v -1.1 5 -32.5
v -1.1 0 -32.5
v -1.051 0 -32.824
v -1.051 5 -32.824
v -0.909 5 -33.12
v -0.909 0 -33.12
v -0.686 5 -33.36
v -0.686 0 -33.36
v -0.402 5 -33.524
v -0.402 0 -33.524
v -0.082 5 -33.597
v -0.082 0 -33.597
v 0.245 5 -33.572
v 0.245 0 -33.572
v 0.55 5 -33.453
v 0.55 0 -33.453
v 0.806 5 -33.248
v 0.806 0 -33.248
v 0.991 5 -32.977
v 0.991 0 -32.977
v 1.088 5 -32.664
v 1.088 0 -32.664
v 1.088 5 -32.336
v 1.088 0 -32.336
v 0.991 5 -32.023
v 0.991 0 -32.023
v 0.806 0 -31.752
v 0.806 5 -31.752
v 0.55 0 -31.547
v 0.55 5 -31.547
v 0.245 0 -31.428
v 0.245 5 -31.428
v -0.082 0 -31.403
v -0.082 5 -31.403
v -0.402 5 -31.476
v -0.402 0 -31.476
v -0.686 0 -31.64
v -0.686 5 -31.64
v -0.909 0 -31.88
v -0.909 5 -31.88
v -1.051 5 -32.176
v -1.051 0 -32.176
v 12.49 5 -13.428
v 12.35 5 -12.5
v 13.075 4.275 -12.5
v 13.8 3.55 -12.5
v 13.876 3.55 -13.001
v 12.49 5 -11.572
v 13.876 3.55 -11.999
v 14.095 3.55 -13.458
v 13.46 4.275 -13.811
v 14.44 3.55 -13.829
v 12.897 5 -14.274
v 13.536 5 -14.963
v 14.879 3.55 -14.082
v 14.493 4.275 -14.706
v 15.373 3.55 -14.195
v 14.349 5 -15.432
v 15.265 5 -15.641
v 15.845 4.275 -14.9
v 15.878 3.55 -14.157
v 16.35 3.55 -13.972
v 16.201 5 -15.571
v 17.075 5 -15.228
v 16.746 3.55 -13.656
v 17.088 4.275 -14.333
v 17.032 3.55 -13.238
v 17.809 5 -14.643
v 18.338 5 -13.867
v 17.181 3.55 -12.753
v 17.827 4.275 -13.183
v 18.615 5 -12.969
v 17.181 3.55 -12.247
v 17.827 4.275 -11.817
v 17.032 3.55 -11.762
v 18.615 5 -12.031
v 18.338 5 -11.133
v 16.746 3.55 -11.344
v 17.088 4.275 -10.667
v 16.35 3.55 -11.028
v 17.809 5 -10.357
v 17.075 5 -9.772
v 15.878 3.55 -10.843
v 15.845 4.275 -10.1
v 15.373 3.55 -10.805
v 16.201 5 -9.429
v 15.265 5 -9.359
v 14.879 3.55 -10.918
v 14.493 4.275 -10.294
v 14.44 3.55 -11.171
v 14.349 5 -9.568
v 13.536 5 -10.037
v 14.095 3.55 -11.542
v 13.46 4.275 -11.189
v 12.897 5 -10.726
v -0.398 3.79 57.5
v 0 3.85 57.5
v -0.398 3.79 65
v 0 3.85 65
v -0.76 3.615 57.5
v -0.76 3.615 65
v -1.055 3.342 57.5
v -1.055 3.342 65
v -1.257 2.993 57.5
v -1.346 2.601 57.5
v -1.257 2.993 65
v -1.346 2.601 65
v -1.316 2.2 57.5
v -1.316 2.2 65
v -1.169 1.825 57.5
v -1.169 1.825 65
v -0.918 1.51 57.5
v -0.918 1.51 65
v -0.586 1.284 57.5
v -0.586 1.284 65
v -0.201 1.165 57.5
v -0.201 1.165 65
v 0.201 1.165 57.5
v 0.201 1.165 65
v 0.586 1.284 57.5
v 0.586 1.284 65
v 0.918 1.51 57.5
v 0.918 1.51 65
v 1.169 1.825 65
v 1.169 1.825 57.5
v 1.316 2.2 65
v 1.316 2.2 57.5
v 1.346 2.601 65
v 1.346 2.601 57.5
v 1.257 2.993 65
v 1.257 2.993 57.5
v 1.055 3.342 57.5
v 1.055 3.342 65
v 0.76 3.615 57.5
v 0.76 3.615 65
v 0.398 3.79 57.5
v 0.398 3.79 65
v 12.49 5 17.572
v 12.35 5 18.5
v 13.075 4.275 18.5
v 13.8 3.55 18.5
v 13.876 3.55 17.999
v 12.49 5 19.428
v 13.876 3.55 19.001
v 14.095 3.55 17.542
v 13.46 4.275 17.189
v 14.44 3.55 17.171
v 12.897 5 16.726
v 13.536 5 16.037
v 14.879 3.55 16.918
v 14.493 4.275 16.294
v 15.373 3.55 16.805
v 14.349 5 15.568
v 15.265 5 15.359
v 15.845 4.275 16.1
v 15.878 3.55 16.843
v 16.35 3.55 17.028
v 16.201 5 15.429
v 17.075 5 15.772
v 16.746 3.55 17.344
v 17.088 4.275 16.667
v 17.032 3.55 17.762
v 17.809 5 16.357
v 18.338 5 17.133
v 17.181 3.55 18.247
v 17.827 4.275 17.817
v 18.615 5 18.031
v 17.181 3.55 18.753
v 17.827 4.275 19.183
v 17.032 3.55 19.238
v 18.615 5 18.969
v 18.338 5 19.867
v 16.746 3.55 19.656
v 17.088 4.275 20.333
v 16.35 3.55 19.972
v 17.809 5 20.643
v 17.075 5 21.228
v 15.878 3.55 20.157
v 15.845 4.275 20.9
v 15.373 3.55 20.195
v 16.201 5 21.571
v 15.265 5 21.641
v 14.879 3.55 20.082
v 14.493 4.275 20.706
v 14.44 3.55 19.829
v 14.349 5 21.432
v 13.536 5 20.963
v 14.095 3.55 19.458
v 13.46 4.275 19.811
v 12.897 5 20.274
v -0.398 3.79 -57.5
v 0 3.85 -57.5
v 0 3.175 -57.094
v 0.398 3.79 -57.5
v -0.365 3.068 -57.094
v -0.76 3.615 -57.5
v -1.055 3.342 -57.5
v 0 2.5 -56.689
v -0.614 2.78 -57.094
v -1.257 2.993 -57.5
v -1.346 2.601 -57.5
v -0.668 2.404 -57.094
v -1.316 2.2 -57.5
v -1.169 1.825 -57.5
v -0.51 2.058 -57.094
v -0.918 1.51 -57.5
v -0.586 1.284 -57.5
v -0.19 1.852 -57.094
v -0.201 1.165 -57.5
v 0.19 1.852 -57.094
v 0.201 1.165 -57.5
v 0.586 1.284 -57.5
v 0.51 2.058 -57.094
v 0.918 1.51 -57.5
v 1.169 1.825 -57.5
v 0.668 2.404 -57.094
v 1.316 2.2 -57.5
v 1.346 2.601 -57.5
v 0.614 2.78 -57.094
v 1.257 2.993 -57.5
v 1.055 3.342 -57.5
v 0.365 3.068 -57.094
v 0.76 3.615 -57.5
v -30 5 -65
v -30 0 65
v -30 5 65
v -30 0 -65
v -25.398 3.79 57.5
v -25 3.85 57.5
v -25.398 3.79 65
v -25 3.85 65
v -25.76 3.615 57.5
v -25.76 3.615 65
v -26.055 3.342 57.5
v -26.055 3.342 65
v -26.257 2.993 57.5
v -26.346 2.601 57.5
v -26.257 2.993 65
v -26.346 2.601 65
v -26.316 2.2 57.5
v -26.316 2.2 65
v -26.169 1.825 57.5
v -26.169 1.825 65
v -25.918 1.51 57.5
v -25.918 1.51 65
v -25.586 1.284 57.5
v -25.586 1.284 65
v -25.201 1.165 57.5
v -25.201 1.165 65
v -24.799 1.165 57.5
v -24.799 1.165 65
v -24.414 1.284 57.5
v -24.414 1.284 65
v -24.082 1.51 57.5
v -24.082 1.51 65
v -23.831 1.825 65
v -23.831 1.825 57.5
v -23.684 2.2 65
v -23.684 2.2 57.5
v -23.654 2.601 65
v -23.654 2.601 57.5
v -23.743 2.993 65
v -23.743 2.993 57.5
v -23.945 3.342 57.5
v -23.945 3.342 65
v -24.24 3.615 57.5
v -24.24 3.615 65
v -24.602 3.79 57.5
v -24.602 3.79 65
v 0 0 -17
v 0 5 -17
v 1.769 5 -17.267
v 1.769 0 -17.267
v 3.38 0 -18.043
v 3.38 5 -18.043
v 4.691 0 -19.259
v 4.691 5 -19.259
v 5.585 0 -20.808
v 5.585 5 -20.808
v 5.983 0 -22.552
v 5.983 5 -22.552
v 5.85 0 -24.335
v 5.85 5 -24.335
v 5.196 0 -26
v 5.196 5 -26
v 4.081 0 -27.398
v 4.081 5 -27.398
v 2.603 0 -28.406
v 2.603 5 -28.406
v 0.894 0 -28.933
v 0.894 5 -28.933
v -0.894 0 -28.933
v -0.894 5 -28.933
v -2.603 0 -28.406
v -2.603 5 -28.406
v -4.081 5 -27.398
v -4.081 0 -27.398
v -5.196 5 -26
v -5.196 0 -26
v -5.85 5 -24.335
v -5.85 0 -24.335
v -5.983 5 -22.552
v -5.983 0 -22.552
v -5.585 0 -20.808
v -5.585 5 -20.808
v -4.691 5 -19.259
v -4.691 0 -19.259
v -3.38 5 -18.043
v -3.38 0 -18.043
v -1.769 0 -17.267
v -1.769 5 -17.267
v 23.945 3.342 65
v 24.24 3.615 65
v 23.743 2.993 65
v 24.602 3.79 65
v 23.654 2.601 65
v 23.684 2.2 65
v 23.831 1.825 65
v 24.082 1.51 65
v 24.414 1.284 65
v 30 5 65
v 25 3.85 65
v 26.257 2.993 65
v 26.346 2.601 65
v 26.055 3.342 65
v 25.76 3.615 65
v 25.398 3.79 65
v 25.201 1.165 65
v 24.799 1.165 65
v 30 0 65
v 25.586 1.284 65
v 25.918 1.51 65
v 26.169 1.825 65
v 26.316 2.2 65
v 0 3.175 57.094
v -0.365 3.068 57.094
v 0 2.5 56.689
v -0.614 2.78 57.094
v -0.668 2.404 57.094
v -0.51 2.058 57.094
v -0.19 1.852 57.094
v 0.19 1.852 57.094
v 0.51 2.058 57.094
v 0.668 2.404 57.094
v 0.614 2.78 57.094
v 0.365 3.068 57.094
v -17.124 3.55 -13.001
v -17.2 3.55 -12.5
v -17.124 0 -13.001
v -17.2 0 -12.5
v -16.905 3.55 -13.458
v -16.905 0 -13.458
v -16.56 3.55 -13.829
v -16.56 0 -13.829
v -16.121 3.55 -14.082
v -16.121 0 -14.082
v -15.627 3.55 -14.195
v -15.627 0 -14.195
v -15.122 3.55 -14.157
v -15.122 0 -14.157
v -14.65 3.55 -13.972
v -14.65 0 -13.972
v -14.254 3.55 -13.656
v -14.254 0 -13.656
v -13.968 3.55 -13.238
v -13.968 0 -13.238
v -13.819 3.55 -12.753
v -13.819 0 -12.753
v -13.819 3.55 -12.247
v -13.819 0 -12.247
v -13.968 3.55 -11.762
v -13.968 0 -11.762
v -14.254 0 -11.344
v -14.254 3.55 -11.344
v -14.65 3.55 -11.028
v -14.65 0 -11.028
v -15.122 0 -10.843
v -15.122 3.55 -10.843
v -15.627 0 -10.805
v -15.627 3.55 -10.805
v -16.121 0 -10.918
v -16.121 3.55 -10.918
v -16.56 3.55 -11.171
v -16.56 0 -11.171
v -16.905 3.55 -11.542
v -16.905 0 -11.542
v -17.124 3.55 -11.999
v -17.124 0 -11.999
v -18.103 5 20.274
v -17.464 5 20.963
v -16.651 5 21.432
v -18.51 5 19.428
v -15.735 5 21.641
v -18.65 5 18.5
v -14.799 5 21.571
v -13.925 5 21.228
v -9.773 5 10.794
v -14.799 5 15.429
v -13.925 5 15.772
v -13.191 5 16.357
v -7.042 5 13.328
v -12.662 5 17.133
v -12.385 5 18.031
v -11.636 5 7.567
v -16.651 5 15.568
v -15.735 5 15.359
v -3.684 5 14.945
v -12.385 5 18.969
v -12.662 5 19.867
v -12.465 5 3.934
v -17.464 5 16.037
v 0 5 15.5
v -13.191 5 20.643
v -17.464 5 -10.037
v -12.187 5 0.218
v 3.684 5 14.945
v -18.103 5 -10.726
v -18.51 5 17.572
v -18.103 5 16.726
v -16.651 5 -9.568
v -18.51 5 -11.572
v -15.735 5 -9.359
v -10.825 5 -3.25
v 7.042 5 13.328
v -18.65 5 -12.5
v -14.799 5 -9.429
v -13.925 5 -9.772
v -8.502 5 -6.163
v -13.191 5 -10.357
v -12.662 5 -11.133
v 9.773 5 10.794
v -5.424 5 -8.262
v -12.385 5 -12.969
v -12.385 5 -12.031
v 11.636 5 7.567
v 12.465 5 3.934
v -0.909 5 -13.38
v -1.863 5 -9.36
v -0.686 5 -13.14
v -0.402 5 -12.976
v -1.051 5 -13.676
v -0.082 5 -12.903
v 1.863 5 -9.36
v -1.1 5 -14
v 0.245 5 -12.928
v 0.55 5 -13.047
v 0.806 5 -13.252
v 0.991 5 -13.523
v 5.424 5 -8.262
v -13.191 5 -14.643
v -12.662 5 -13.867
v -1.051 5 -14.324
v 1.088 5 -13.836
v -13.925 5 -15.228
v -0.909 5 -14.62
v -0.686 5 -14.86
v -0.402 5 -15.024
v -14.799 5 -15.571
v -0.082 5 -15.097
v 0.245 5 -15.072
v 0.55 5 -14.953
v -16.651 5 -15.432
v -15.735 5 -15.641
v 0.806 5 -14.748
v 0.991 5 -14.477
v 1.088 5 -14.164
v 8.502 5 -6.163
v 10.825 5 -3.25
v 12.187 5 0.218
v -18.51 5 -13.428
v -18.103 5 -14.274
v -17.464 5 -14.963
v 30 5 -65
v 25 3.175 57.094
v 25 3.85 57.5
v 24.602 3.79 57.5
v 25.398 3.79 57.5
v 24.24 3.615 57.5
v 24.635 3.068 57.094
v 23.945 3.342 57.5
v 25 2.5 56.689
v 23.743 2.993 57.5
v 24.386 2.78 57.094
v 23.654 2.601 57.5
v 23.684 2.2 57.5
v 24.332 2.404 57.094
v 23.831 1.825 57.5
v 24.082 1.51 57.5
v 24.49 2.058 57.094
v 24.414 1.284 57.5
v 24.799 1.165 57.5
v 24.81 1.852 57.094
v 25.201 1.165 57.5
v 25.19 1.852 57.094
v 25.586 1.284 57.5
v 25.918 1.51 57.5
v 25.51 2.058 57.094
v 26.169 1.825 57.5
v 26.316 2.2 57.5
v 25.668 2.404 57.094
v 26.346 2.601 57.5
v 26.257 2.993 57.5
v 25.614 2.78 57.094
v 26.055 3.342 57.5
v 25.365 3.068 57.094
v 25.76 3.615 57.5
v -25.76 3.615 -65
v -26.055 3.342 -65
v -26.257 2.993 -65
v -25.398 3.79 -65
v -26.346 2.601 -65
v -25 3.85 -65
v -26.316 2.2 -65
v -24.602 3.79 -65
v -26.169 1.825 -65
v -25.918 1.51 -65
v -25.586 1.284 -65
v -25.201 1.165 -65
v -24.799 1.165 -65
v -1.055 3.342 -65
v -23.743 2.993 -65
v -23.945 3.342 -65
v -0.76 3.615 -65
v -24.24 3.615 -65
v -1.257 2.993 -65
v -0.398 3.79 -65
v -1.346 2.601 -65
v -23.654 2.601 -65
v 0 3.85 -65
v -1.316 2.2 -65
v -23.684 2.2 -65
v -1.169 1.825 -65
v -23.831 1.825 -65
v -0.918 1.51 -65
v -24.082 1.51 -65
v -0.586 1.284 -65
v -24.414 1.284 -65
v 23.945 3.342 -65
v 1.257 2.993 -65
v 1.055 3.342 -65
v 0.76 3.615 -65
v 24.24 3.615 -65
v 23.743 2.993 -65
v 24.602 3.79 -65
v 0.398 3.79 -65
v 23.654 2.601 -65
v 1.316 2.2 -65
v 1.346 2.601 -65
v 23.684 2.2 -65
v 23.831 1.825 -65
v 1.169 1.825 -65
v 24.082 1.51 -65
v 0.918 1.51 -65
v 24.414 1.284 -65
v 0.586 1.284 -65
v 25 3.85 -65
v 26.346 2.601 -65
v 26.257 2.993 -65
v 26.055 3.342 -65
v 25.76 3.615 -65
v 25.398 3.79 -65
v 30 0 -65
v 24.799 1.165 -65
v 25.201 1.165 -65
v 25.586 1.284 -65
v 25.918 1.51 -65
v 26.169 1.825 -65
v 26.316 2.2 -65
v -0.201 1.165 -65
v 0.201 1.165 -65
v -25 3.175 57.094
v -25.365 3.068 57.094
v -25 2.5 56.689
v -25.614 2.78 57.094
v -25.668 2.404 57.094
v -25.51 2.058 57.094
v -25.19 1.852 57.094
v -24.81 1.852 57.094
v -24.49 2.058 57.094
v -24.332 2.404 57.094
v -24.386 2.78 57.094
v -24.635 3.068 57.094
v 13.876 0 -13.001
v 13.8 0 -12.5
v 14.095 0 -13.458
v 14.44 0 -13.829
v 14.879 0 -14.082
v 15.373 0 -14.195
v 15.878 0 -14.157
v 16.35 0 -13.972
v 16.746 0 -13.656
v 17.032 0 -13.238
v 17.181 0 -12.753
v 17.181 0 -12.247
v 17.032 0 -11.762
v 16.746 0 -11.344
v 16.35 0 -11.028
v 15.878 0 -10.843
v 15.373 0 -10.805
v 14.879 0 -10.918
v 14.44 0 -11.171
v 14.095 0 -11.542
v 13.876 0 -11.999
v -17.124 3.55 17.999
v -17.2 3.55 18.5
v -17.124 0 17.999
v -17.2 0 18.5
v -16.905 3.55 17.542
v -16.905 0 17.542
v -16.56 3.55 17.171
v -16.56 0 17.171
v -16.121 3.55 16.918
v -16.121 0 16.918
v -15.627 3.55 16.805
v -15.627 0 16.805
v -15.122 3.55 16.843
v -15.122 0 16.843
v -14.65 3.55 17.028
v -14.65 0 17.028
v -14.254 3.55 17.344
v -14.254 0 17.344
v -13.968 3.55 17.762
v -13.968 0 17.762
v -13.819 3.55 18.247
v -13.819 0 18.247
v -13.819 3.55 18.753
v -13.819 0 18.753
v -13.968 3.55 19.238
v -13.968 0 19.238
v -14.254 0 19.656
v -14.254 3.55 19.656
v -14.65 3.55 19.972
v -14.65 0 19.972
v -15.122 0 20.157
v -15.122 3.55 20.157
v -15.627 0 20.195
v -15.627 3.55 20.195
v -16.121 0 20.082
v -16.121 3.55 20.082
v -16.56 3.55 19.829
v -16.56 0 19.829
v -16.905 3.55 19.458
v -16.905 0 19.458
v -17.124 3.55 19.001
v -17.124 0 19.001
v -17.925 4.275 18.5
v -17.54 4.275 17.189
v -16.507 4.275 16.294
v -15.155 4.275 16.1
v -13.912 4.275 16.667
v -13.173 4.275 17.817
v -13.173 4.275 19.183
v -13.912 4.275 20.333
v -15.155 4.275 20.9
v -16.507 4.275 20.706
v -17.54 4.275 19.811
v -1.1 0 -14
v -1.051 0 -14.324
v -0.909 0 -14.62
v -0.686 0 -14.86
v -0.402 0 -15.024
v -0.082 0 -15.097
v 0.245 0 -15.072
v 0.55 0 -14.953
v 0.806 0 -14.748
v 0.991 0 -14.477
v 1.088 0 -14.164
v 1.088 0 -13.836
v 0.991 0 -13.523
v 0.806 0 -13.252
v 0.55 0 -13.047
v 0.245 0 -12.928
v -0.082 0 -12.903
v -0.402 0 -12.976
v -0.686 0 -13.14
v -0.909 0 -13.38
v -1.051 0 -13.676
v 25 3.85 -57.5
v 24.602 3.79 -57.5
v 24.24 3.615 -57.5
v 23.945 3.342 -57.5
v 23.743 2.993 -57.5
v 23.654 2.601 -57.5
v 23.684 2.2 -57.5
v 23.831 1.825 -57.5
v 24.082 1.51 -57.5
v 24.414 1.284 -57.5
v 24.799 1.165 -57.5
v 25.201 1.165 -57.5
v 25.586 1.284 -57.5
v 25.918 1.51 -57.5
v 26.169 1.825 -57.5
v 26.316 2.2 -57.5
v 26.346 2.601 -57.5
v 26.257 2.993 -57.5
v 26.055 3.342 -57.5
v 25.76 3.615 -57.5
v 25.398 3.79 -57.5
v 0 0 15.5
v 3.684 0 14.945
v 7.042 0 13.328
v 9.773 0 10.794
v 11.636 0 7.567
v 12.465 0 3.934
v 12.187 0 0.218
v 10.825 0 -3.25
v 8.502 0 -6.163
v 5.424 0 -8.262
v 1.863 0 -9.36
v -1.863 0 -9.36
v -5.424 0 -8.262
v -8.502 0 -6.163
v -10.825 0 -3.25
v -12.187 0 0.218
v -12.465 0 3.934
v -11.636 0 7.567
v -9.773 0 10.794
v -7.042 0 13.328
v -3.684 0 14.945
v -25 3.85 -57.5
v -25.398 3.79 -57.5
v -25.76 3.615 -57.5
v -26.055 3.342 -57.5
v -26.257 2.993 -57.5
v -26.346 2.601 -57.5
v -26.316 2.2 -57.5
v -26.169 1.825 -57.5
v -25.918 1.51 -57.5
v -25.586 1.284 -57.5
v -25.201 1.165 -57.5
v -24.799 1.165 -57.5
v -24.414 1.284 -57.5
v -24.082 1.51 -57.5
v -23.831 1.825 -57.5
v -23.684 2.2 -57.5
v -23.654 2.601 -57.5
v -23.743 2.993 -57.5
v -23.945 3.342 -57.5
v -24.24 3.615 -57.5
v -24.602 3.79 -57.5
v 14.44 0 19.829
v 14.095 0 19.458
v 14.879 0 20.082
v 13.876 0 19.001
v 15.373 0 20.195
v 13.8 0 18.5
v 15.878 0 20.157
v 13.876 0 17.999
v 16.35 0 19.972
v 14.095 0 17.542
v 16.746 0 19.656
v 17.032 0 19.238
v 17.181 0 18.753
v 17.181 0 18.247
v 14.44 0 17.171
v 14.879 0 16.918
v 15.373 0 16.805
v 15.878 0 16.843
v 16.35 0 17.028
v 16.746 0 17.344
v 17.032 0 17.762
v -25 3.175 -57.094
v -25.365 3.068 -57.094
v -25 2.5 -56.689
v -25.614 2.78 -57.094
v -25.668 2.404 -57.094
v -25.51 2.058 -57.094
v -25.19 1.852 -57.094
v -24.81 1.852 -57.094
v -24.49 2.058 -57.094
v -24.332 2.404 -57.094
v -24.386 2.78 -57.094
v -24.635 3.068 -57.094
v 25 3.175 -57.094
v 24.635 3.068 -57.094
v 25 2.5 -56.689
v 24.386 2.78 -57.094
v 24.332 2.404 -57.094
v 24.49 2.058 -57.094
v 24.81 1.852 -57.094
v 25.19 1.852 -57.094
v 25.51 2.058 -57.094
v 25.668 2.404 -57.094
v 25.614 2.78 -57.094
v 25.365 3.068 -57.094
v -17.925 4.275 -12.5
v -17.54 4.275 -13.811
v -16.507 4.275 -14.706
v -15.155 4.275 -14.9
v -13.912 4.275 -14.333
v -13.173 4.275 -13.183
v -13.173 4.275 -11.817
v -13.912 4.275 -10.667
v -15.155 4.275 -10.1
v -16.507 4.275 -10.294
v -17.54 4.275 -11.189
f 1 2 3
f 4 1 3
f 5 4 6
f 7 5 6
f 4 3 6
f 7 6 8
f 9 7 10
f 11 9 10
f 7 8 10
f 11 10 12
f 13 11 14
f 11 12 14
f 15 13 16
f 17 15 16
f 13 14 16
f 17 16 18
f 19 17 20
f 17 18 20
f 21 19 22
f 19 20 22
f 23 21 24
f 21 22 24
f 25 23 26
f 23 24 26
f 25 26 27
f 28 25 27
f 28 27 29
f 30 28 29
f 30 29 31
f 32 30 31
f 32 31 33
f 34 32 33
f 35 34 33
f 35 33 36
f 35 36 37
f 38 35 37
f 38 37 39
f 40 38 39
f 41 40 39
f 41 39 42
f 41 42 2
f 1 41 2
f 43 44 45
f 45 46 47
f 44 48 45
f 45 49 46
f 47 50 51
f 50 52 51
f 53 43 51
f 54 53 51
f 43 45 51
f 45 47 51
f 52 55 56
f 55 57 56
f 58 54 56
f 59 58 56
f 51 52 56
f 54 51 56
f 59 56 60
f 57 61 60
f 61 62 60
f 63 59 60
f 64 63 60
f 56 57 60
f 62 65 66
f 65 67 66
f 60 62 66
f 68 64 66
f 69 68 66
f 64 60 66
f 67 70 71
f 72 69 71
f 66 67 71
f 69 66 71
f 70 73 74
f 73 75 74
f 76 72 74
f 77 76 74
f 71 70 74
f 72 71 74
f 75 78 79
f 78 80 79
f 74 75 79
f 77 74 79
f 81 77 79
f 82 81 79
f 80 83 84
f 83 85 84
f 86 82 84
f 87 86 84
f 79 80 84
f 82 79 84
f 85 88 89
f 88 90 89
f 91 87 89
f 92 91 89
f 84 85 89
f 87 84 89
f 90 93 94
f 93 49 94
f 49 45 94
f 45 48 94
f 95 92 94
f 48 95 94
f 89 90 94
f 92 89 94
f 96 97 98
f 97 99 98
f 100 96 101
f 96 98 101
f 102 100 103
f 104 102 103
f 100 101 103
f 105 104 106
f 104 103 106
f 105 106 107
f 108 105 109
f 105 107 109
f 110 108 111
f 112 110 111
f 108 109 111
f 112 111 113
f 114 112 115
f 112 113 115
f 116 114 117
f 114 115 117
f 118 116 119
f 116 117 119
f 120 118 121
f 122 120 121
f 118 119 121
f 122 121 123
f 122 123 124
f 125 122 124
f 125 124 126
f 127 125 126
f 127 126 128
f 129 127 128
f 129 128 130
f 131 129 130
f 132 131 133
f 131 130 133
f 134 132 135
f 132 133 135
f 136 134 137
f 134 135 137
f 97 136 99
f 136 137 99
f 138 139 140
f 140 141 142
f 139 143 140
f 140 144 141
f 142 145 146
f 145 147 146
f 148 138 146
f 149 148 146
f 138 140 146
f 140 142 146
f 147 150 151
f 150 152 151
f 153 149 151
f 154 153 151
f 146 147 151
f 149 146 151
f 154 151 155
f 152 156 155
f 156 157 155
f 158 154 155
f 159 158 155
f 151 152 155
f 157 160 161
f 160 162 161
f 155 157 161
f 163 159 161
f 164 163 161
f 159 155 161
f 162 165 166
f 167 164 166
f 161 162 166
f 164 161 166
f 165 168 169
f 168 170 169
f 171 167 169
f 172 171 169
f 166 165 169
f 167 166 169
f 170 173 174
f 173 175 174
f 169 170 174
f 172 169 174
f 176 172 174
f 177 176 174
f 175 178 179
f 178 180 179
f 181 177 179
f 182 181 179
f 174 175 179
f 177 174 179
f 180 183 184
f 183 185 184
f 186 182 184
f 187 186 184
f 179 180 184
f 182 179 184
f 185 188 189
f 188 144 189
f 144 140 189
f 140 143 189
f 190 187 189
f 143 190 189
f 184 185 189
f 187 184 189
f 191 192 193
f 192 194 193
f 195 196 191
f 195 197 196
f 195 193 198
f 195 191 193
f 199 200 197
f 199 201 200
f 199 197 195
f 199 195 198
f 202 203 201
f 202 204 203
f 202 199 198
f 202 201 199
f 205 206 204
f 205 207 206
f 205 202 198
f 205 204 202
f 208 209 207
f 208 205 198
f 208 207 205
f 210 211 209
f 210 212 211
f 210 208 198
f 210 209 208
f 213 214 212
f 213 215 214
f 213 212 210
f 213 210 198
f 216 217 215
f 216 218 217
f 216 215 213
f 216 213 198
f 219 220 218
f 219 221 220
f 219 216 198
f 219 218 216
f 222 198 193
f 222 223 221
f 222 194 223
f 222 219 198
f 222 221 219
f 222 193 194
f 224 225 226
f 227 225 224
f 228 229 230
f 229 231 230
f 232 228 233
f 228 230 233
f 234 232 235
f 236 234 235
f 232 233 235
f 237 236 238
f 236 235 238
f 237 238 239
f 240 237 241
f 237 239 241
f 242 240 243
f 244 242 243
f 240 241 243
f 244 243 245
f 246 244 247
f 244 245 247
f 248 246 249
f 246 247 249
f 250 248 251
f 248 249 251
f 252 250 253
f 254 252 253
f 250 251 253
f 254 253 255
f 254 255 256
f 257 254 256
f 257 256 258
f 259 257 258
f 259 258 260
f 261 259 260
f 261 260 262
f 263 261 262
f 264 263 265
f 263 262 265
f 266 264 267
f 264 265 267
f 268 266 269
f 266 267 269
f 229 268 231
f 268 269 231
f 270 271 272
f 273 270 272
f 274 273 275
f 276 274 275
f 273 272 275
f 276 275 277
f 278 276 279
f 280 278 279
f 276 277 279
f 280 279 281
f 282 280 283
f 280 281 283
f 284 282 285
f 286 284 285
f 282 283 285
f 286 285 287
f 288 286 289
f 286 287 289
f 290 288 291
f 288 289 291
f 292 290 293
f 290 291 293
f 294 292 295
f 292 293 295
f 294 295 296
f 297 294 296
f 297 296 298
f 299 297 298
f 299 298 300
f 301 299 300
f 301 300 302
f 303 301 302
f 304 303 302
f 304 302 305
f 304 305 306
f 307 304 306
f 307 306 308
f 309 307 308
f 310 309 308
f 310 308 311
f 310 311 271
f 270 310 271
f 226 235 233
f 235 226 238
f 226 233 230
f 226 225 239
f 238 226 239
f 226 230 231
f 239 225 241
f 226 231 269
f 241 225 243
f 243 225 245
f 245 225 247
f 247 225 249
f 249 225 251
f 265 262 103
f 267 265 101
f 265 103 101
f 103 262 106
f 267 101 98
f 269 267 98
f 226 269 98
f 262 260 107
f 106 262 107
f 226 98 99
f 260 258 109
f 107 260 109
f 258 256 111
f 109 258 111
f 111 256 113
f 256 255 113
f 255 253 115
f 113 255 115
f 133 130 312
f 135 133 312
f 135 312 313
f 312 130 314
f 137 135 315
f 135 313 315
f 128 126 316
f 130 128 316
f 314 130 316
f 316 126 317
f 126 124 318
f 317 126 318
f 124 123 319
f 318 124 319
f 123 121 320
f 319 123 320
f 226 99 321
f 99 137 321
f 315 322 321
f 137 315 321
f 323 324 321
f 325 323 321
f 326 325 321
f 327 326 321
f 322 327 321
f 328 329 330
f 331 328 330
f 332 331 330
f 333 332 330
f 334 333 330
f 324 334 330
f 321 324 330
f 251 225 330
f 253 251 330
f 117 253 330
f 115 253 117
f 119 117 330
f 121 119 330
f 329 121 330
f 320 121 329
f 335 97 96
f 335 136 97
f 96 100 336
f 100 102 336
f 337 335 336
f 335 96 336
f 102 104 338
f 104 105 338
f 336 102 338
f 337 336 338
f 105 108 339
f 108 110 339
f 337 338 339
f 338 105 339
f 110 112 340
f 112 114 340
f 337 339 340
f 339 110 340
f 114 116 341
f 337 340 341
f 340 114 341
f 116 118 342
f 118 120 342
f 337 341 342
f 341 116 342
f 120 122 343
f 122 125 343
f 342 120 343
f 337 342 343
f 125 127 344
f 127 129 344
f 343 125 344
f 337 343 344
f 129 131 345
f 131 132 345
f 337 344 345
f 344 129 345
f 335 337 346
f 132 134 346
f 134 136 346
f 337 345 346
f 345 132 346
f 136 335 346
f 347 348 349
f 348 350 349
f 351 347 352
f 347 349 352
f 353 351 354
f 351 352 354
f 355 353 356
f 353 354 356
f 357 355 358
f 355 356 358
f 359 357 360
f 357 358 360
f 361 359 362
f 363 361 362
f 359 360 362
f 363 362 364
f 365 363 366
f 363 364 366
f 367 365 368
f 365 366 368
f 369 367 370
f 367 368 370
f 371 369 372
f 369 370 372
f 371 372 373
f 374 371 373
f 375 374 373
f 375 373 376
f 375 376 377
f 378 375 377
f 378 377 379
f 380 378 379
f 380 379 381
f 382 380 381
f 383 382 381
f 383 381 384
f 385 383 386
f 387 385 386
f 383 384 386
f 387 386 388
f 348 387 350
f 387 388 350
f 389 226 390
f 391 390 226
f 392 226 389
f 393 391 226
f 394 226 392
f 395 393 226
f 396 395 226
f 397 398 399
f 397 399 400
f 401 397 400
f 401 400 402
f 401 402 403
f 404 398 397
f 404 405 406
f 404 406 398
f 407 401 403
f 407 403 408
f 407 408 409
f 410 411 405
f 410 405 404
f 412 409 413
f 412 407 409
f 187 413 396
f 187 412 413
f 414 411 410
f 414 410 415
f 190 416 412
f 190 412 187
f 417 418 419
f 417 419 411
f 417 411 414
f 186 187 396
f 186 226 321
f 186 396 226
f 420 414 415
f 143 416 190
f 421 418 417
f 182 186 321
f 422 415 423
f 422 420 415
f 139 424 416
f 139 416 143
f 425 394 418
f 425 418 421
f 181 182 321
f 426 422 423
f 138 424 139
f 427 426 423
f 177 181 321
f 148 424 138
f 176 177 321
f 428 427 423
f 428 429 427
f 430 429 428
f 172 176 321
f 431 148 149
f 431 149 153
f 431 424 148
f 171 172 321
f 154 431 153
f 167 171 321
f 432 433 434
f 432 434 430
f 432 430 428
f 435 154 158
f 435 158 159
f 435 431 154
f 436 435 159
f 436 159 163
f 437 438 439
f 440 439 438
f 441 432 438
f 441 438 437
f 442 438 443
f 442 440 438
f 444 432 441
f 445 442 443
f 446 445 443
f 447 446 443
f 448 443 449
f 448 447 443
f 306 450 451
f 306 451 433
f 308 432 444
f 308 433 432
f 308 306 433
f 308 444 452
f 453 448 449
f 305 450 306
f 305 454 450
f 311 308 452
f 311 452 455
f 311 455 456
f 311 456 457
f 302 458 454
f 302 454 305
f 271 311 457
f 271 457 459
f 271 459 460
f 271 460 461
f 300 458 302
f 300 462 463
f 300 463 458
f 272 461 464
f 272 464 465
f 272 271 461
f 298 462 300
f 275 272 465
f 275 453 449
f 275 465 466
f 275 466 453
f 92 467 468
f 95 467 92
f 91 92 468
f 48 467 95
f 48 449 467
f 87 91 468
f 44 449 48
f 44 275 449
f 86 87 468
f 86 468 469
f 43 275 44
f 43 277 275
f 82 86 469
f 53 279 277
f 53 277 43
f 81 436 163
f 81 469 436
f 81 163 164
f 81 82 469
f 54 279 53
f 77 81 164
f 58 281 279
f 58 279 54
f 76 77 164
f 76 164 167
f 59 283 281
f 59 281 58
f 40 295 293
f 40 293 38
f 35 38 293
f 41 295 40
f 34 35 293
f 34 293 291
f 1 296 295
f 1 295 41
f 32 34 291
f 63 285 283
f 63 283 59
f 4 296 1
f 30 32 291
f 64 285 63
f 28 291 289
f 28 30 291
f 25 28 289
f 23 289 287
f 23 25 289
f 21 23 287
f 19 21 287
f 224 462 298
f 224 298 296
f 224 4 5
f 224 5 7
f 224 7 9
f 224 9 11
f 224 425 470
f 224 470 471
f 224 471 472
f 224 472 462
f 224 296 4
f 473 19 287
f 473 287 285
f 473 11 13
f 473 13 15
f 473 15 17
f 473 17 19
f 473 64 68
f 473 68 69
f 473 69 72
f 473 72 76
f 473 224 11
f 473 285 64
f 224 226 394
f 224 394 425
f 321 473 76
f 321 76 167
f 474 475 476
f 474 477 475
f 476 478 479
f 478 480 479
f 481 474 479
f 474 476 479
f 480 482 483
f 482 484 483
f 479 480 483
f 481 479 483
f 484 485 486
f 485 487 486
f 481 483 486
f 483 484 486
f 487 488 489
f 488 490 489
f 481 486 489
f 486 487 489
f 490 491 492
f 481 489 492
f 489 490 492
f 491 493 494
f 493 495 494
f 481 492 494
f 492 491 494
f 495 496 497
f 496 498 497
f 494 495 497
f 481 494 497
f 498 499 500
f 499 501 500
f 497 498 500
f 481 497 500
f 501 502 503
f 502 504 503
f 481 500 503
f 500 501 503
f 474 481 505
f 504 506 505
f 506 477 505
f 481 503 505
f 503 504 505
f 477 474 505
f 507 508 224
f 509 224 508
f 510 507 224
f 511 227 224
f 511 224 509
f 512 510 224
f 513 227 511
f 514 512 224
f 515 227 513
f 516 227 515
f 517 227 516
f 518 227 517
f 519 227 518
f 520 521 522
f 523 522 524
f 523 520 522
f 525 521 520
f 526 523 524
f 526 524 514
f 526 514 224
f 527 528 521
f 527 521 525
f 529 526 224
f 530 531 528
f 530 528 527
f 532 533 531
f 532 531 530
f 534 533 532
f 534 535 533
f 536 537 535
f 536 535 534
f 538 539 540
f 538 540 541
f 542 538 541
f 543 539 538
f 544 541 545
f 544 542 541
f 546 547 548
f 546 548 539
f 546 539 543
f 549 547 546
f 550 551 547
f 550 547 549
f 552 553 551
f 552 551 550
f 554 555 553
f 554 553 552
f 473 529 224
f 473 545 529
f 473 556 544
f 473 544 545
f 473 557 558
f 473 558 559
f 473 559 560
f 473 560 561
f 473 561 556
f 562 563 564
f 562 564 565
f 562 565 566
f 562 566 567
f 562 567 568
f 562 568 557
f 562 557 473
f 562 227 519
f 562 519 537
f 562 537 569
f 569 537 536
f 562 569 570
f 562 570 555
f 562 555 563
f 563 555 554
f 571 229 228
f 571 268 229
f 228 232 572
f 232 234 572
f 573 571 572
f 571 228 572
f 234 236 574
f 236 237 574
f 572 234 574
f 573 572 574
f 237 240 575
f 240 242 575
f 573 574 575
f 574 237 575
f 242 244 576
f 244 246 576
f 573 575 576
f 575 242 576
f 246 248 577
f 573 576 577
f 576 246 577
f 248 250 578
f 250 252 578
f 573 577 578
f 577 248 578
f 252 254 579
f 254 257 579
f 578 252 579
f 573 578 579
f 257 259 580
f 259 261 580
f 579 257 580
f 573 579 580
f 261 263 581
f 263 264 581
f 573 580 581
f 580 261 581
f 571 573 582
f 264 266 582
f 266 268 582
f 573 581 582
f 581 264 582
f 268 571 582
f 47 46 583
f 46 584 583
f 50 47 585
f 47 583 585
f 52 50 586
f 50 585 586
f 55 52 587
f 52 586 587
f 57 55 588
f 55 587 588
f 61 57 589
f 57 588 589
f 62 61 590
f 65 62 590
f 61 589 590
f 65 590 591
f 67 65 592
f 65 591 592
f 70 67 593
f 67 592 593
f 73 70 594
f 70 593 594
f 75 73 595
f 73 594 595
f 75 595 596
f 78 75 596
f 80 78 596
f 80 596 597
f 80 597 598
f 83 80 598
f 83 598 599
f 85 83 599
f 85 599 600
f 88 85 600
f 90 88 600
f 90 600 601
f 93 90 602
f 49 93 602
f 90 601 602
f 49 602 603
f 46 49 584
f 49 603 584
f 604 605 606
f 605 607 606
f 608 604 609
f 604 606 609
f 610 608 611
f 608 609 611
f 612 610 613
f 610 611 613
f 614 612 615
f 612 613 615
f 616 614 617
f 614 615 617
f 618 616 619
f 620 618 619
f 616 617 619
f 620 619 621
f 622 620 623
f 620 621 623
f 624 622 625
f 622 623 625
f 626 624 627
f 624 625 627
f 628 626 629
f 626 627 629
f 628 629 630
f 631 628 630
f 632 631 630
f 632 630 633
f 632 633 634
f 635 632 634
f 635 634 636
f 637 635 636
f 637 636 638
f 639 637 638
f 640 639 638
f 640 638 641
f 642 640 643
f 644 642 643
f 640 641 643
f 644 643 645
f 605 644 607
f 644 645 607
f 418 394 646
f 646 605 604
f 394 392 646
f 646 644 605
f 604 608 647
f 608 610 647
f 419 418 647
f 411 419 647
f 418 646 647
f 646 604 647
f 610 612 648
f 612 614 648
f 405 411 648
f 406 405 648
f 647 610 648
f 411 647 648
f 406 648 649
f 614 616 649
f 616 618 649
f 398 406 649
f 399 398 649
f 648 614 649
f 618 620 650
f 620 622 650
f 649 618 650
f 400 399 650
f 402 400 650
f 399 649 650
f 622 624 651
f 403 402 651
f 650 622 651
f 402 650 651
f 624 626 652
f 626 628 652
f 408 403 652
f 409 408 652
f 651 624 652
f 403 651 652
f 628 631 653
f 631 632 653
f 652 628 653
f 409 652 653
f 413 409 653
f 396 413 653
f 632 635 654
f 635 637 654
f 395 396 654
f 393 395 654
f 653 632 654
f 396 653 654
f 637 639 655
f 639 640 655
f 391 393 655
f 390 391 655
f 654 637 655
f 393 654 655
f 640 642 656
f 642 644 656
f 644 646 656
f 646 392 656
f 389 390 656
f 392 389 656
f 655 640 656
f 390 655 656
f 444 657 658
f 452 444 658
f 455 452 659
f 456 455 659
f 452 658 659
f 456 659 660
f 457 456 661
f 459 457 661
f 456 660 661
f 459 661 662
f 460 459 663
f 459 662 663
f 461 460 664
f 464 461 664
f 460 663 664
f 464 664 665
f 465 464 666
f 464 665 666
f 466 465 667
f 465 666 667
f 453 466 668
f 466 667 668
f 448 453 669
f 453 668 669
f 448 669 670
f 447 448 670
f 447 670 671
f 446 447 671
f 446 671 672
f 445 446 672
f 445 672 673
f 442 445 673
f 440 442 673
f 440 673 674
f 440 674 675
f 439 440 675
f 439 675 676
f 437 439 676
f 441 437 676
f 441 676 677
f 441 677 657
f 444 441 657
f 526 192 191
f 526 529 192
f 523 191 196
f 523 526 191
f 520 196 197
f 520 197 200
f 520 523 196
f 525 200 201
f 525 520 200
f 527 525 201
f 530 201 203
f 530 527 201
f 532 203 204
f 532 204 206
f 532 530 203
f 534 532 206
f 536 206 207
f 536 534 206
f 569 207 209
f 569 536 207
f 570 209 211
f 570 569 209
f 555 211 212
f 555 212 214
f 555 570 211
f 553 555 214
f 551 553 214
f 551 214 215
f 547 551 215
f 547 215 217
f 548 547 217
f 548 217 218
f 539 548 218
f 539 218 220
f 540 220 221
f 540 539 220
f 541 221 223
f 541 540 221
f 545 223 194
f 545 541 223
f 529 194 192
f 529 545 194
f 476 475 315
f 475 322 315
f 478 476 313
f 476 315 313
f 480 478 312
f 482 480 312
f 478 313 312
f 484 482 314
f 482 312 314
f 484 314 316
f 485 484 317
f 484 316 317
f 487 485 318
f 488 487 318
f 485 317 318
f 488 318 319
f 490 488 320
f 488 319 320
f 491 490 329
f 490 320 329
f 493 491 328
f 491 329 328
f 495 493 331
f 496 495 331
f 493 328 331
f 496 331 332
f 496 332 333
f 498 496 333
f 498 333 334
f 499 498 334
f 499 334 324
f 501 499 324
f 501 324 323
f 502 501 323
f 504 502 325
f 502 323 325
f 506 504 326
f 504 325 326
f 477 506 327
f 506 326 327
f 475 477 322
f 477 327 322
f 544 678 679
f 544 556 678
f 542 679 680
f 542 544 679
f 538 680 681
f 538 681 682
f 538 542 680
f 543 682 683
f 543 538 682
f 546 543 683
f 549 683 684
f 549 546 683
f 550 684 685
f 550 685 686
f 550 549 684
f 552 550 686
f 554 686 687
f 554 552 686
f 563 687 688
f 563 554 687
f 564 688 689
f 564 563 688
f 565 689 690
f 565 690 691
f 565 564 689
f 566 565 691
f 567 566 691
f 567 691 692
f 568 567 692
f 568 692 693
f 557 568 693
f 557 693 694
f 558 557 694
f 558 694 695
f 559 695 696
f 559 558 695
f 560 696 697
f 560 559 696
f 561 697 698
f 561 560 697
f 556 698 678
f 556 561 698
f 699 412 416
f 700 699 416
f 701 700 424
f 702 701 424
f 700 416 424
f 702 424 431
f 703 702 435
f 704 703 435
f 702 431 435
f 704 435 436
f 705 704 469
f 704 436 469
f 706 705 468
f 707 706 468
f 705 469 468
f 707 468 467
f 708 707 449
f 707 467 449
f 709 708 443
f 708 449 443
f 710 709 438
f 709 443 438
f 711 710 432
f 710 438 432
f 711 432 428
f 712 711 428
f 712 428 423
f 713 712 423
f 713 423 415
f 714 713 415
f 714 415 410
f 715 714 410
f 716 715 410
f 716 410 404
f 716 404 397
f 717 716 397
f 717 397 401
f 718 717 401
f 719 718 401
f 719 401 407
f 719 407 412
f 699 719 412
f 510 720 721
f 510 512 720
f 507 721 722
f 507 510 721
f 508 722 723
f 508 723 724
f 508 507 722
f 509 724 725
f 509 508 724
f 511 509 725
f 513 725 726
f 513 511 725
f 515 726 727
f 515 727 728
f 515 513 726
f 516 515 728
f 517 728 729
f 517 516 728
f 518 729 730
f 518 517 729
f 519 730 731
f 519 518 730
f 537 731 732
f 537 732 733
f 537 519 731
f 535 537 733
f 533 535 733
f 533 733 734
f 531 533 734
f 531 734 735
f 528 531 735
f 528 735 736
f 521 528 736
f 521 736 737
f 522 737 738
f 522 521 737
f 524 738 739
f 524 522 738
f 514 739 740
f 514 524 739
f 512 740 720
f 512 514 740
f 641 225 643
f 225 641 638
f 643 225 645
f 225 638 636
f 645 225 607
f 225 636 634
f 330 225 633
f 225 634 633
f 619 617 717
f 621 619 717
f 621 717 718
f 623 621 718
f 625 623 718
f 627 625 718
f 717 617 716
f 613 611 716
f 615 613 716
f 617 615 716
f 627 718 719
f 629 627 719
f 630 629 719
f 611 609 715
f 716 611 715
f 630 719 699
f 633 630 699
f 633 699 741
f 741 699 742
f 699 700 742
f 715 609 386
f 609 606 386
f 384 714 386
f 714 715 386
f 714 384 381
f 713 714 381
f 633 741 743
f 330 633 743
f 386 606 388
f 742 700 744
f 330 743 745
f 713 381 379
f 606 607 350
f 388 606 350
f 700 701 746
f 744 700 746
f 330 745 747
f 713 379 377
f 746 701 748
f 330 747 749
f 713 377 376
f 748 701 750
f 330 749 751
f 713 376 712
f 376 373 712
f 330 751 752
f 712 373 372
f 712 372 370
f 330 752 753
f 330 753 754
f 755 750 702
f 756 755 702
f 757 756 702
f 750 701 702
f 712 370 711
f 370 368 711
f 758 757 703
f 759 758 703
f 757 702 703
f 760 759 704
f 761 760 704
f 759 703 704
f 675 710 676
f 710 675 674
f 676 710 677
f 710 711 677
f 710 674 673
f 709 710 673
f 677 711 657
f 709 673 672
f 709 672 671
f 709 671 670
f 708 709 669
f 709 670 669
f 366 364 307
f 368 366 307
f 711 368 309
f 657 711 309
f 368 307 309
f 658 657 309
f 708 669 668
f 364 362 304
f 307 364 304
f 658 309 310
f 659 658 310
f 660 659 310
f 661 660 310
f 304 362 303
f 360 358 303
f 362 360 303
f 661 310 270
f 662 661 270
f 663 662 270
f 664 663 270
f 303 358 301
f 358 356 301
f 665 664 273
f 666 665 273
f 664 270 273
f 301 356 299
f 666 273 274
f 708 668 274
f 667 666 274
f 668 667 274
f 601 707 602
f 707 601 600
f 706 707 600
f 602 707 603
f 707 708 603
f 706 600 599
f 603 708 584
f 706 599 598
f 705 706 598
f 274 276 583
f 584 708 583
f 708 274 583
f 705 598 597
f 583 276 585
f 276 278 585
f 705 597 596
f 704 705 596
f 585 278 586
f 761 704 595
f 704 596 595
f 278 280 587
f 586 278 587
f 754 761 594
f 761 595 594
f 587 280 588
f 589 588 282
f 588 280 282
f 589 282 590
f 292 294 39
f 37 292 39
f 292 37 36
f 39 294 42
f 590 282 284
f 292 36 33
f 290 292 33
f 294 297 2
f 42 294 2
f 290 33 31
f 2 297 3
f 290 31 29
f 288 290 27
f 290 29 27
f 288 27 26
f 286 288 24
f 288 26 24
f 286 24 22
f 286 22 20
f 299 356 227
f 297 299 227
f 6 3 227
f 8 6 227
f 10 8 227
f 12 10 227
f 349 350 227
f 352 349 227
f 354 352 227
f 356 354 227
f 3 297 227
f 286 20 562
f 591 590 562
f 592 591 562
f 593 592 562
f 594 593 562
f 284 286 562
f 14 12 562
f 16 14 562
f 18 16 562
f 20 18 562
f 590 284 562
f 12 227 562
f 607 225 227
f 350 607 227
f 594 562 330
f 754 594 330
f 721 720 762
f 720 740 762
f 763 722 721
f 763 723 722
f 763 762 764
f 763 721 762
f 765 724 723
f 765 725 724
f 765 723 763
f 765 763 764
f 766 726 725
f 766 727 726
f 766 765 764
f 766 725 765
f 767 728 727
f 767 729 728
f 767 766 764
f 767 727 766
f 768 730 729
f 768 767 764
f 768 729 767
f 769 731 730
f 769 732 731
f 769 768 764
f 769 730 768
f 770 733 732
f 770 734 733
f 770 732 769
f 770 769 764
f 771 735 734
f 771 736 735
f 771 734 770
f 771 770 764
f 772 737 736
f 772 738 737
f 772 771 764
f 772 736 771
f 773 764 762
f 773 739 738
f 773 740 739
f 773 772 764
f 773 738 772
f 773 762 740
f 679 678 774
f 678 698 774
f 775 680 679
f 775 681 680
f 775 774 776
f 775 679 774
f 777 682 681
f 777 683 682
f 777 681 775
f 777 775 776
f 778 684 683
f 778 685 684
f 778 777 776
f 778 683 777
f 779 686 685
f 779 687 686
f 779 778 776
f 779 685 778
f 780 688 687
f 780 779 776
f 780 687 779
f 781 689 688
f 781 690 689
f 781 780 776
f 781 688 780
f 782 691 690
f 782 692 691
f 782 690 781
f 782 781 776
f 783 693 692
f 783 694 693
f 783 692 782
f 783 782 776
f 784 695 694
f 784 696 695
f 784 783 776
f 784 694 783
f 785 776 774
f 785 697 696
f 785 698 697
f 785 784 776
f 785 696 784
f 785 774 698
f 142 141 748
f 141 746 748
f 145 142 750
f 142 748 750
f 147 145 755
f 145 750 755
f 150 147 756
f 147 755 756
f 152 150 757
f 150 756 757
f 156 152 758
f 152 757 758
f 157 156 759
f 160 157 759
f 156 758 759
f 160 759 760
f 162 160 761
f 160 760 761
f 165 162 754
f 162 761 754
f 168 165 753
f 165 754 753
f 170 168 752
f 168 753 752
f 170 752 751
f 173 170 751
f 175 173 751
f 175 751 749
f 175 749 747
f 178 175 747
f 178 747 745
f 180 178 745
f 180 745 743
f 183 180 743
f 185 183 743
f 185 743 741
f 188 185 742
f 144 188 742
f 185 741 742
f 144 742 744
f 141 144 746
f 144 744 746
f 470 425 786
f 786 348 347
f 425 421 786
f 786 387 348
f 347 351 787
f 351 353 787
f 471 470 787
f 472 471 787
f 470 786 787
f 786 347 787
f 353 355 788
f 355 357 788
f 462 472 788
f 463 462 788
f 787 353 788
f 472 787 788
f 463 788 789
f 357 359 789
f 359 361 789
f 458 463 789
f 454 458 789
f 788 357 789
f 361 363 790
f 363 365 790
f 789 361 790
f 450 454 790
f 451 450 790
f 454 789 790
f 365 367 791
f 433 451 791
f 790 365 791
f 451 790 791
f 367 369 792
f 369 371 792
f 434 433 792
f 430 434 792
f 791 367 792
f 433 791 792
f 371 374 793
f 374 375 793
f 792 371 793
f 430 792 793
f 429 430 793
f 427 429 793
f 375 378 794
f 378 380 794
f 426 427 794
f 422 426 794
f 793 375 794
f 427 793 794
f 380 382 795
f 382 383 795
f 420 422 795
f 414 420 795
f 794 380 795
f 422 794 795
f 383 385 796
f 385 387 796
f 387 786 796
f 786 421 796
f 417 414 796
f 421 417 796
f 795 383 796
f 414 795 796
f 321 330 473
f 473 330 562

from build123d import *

# Parameters (mm, degrees)
SKETCH_1_W                   = 60
SKETCH_1_H                   = 130
EXTRUDE_1_DEPTH              = 5
HOLE_WIZARD_M3_1_D           = 3.4
HOLE_WIZARD_M3_1_DEPTH       = 7.5
HOLE_WIZARD_M3_1_CSINK_D     = 6.3
HOLE_WIZARD_M3_1_CSINK_ANGLE = 90
HOLE_WIZARD_M3_1_TIP         = 1.021463052
SKETCH_6_R                   = 12.5
CUT_EXTRUDE_1_DEPTH          = 72.763500472
F_1_0MM_2_AT_2_COUNT         = 2
F_1_0MM_2_AT_2_PITCH         = 25
F_1_0MM_2_AT_3_COUNT         = 2
F_1_0MM_2_AT_3_PITCH         = 50
F_1_0MM_1_D                  = 2.2
SKETCH_13_R                  = 6
CUT_EXTRUDE_2_DEPTH          = 72.763500472


with BuildPart() as part:
    # 草圖1 → 填料-伸長1 (new body)
    with BuildSketch(Plane(origin=(0, 0, 0), x_dir=(1, 0, 0), z_dir=(0, 1, 0))):
        Rectangle(SKETCH_1_W, SKETCH_1_H)
    extrude(amount=EXTRUDE_1_DEPTH)

    # M3 錐坑平頭螺釘的錐孔1
    with Locations(Plane(origin=(0, 5, 0), x_dir=(1, 0, 0), z_dir=(0, 1, 0))):
        with Locations((-15.5, 12.5), (-15.5, -18.5), (15.5, 12.5), (15.5, -18.5)):
            CounterSinkHole(HOLE_WIZARD_M3_1_D / 2, HOLE_WIZARD_M3_1_CSINK_D / 2, depth=HOLE_WIZARD_M3_1_DEPTH, counter_sink_angle=HOLE_WIZARD_M3_1_CSINK_ANGLE)
            with Locations((0, 0, -(HOLE_WIZARD_M3_1_DEPTH + HOLE_WIZARD_M3_1_TIP / 2))):  # 118° drill point
                Cone(0, HOLE_WIZARD_M3_1_D / 2, HOLE_WIZARD_M3_1_TIP, mode=Mode.SUBTRACT)

    # 草圖6 → 除料-伸長1 (cut, through all)
    with BuildSketch(Plane(origin=(0, 5, 0), x_dir=(1, 0, 0), z_dir=(0, 1, 0))):
        with Locations(Location((0, -3, 0), (0, 0, 270))):
            Circle(SKETCH_6_R)
    extrude(amount=-CUT_EXTRUDE_1_DEPTH, mode=Mode.SUBTRACT)

    # 草圖8 → Ø1.0mm 定位孔2 (revolve, cut)
    with BuildSketch(Plane(origin=(25, 2.5, -65), x_dir=(0, 1, 0), z_dir=(1, 0, 0))):
        Polygon((0, 0), (0, 8.311161836), (1.35, 7.5), (1.35, 0), align=None)
    f_1_0mm_2 = revolve(axis=Axis((25, 2.5, -71.35), (0, 0, 1)), mode=Mode.SUBTRACT)

    # Ø1.0mm 定位孔2 at 2: Ø1.0mm 定位孔2 ×2
    with Locations(*[(-i * F_1_0MM_2_AT_2_PITCH, 0, 0) for i in range(1, F_1_0MM_2_AT_2_COUNT)]):
        add(f_1_0mm_2, mode=Mode.SUBTRACT)

    # Ø1.0mm 定位孔2 at 3: Ø1.0mm 定位孔2 ×2
    with Locations(*[(-i * F_1_0MM_2_AT_3_PITCH, 0, 0) for i in range(1, F_1_0MM_2_AT_3_COUNT)]):
        add(f_1_0mm_2, mode=Mode.SUBTRACT)

    # 鏡射1: Ø1.0mm 定位孔2 across plane
    add(f_1_0mm_2.mirror(Plane.XY), mode=Mode.SUBTRACT)

    # 鏡射1 copy 1 sketch → 鏡射1 copy 1 (revolve, cut)
    with BuildSketch(Plane(origin=(0, 2.5, 65), x_dir=(0, 1, 0), z_dir=(1, 0, 0))):
        Polygon((0, 0), (0, -8.311161836), (1.35, -7.5), (1.35, 0), align=None)
    revolve(axis=Axis((0, 2.5, 71.35), (0, 0, 1)), mode=Mode.SUBTRACT)

    # 鏡射1 copy 2 sketch → 鏡射1 copy 2 (revolve, cut)
    with BuildSketch(Plane(origin=(-25, 2.5, 65), x_dir=(0, 1, 0), z_dir=(1, 0, 0))):
        Polygon((0, 0), (0, -8.311161836), (1.35, -7.5), (1.35, 0), align=None)
    revolve(axis=Axis((-25, 2.5, 71.35), (0, 0, 1)), mode=Mode.SUBTRACT)

    # Ø1.0mm 定位孔1 (through all)
    with Locations(Plane(origin=(0, 5, 0), x_dir=(1, 0, 0), z_dir=(0, 1, 0))):
        with Locations((0, 32.5), (0, 14)):
            Hole(F_1_0MM_1_D / 2)

    # 草圖13 → 除料-伸長2 (cut, through all)
    with BuildSketch(Plane(origin=(0, 5, 0), x_dir=(1, 0, 0), z_dir=(0, 1, 0))):
        with Locations(Location((0, 23, 0), (0, 0, 270))):
            Circle(SKETCH_13_R)
    extrude(amount=-CUT_EXTRUDE_2_DEPTH, mode=Mode.SUBTRACT)


solid = part.part
